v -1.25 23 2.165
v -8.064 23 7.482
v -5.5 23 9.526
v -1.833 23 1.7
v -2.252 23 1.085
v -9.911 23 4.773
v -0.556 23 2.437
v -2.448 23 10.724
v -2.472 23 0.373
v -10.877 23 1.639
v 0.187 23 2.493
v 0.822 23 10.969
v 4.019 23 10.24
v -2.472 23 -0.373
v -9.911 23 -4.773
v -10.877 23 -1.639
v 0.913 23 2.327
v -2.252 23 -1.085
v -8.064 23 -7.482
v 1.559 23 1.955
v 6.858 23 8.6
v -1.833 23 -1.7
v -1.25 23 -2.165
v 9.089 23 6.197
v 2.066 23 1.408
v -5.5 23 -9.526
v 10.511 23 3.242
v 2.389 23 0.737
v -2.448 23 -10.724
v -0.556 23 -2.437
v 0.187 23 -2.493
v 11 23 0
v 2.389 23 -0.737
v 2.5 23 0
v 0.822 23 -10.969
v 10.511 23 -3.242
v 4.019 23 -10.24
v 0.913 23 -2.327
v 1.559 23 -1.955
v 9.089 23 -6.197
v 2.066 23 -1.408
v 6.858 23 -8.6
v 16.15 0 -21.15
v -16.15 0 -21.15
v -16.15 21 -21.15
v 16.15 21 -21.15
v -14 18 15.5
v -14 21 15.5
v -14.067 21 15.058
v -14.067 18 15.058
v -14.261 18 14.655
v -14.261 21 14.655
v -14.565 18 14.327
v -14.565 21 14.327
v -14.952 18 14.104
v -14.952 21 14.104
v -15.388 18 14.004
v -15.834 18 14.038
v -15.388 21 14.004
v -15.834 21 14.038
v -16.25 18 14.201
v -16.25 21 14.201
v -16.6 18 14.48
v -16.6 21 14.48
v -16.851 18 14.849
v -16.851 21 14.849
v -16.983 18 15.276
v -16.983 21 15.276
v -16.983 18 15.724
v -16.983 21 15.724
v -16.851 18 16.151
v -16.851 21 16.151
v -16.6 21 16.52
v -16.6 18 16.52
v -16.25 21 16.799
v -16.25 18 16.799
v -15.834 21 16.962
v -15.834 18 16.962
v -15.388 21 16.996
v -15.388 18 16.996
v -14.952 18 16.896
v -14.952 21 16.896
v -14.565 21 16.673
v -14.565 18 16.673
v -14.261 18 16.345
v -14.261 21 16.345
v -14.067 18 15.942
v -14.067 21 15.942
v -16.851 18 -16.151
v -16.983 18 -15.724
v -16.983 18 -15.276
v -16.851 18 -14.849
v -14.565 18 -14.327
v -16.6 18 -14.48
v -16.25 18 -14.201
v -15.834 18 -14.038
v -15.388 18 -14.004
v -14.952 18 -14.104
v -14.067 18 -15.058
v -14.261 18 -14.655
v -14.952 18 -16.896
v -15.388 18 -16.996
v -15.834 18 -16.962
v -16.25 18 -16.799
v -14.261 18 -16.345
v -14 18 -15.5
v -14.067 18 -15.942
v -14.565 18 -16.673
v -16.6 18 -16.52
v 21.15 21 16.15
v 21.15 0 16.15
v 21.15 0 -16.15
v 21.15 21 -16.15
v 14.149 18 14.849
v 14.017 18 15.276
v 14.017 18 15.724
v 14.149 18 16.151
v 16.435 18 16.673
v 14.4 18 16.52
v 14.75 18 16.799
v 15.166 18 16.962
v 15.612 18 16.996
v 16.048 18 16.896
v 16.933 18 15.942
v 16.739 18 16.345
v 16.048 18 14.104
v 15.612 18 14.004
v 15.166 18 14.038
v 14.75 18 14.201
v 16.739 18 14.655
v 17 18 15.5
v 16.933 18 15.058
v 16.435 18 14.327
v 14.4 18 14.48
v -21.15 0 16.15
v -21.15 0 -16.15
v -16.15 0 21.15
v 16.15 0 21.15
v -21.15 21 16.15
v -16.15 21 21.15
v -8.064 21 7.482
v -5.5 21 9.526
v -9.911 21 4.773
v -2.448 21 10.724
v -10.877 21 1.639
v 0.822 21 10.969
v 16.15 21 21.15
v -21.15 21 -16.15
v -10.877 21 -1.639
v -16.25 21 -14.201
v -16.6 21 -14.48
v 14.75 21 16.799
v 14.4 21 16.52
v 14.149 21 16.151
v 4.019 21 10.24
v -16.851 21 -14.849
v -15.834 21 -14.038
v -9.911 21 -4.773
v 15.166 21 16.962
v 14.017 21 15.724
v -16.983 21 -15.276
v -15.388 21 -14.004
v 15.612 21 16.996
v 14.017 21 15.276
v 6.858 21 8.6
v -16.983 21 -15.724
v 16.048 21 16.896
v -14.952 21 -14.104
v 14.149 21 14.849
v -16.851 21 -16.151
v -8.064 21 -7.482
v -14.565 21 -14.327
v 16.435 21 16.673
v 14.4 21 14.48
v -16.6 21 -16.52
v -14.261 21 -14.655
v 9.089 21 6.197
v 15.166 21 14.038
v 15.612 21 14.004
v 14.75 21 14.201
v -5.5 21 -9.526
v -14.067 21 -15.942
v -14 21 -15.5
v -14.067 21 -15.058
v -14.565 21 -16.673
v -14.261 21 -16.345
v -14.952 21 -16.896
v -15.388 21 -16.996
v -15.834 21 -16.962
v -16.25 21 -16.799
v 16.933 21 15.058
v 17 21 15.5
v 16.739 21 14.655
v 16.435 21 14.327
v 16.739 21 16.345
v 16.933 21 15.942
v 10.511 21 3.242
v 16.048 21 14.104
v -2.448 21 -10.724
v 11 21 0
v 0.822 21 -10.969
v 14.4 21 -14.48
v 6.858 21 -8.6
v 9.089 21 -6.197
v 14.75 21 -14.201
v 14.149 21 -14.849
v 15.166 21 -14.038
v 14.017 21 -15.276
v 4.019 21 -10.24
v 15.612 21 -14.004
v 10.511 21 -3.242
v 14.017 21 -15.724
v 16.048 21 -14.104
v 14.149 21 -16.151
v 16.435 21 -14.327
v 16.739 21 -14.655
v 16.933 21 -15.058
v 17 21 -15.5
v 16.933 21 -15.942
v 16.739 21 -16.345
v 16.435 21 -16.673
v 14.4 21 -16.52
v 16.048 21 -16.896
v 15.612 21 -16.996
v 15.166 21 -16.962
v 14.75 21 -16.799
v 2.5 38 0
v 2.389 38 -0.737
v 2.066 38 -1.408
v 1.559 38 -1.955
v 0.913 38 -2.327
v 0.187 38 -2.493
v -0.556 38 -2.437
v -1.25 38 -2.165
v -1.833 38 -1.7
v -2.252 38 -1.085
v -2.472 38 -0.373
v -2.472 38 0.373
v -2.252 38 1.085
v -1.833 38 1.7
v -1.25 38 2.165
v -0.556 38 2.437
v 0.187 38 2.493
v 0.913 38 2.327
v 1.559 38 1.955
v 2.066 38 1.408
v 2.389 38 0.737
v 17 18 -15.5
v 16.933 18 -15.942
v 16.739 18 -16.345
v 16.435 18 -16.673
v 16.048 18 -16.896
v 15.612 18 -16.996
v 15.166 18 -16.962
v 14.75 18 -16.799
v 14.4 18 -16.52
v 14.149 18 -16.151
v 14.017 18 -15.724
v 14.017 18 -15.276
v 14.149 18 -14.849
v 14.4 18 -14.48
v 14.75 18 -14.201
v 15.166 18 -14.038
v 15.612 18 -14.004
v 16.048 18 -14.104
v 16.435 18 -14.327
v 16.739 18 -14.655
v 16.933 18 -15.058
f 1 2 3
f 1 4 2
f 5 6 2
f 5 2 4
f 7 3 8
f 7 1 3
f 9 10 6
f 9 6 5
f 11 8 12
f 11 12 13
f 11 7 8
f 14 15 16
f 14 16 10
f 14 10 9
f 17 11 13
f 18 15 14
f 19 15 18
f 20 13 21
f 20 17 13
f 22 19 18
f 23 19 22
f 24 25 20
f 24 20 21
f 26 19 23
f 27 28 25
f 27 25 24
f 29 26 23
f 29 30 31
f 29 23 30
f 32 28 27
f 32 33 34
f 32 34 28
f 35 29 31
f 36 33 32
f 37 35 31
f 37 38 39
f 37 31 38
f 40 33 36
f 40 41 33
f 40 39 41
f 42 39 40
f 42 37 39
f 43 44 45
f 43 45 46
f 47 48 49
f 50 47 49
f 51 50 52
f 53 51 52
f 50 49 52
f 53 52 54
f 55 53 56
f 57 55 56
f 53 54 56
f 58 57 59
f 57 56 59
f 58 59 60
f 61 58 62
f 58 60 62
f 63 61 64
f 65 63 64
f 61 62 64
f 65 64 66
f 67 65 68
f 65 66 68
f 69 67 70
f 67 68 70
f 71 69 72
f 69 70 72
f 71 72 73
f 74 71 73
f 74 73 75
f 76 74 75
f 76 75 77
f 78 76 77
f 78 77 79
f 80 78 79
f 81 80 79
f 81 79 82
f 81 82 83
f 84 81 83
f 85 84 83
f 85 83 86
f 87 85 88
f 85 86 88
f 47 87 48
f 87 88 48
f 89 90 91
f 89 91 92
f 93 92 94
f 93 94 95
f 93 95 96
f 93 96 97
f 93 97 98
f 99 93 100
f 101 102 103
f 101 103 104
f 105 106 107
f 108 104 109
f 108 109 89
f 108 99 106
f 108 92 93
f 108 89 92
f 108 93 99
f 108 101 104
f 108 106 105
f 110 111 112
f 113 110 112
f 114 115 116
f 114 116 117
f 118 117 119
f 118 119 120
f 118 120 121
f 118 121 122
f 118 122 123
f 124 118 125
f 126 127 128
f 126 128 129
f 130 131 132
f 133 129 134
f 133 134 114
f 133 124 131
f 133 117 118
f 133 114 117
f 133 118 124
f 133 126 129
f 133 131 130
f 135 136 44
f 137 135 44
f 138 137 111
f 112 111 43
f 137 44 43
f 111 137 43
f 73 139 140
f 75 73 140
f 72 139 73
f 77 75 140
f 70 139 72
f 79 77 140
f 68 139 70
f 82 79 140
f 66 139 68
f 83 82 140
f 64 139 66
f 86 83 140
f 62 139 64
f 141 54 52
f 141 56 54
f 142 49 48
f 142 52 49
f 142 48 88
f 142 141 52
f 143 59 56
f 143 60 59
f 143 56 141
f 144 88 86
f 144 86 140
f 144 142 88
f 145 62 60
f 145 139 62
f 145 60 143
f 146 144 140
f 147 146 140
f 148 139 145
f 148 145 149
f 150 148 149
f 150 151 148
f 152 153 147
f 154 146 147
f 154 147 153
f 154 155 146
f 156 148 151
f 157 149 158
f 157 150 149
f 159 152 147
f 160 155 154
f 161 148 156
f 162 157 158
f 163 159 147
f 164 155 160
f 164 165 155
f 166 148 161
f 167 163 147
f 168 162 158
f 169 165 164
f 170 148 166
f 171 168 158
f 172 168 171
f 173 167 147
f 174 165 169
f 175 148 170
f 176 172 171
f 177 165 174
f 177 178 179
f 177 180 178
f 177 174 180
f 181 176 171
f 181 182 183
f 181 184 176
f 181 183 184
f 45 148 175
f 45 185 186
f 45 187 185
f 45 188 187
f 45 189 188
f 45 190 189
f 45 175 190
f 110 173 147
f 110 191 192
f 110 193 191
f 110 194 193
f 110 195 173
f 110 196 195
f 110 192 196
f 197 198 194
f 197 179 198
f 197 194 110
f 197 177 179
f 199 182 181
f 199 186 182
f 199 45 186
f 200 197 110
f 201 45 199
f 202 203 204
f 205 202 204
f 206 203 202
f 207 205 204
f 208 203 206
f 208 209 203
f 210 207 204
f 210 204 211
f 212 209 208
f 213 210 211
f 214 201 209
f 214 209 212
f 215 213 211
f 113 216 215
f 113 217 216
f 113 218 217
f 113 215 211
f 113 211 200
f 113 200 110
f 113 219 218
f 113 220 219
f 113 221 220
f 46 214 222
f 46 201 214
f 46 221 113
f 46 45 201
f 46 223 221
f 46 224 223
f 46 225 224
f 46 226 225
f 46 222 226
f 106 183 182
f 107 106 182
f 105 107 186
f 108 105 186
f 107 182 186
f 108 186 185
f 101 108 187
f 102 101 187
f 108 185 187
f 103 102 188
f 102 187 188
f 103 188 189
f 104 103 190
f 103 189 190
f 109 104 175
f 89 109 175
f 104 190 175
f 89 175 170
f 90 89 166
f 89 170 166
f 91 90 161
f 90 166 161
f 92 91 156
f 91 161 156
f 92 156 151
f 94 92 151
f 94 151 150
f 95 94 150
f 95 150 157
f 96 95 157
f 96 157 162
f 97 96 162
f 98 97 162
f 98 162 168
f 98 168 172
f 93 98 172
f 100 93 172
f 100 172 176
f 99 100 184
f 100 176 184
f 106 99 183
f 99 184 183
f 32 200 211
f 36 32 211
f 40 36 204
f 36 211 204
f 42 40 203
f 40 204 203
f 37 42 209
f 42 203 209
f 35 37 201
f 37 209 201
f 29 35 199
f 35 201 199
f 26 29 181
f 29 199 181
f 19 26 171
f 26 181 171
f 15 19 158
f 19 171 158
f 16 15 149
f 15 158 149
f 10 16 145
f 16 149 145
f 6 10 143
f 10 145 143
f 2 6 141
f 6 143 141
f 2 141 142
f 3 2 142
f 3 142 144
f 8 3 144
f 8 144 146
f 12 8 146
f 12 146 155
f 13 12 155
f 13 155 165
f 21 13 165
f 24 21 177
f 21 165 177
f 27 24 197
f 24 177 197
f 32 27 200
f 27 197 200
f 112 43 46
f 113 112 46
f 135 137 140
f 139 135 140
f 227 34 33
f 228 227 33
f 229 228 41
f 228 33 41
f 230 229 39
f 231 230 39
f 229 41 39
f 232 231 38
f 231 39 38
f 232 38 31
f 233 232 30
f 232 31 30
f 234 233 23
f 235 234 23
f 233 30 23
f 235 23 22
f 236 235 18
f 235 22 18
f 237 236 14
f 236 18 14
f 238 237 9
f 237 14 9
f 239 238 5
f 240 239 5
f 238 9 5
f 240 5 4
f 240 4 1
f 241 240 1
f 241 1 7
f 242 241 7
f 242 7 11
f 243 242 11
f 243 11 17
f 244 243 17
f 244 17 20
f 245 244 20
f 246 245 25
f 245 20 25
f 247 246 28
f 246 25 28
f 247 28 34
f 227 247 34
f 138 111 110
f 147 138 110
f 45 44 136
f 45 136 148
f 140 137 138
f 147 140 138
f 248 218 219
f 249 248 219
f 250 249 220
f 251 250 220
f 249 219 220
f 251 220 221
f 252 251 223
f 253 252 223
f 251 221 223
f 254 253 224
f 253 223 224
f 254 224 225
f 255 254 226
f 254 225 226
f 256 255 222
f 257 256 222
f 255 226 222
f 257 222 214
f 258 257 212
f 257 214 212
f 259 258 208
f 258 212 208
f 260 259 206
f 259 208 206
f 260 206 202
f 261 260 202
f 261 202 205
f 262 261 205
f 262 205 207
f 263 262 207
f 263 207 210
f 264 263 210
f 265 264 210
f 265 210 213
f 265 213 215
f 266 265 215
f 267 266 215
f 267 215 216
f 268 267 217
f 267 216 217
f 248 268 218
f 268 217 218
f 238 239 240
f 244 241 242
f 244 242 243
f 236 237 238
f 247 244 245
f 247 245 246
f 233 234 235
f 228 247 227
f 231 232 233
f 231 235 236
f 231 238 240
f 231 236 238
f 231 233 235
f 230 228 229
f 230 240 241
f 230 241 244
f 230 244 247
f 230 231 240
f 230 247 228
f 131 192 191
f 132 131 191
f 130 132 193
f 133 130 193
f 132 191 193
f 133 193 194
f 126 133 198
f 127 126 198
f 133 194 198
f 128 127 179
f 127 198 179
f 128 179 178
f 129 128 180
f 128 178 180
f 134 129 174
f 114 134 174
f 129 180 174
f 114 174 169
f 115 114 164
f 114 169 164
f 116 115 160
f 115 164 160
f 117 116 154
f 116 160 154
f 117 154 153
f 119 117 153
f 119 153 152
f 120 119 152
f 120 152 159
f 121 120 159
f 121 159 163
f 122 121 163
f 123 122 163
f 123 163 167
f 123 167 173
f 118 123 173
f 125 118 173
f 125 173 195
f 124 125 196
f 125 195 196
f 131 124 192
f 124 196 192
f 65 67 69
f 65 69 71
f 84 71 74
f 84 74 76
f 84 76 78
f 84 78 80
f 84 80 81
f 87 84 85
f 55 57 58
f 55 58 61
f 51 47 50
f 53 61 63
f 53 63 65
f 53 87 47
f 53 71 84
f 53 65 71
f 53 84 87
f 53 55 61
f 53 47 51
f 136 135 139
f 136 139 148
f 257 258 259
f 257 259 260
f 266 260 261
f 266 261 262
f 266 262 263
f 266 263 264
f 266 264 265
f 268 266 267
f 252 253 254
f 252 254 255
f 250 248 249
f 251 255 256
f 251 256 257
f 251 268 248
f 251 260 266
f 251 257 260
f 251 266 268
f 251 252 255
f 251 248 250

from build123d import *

# Parameters (mm, degrees)
SKETCH1_W           = 42.3
SKETCH1_H           = 42.3
BOSS_EXTRUDE1_DEPTH = 21
CHAMFER1_SIZE       = 5
SKETCH2_R           = 1.5
CUT_EXTRUDE1_DEPTH  = 3
SKETCH3_R           = 11
BOSS_EXTRUDE2_DEPTH = 2
SKETCH4_R           = 2.5
BOSS_EXTRUDE3_DEPTH = 15


with BuildPart() as part:
    # Sketch1 → Boss-Extrude1 (new body)
    with BuildSketch(Plane(origin=(0, 0, 0), x_dir=(1, 0, 0), z_dir=(0, 1, 0))):
        Rectangle(SKETCH1_W, SKETCH1_H)
    extrude(amount=BOSS_EXTRUDE1_DEPTH)

    # Chamfer1
    chamfer1_edges = [part.edges().sort_by_distance(p)[0] for p in [
        (21.15, 10.5, 21.15),
        (-21.15, 10.5, 21.15),
        (-21.15, 10.5, -21.15),
        (21.15, 10.5, -21.15),
    ]]
    chamfer(chamfer1_edges, length=CHAMFER1_SIZE)

    # Sketch2 → Cut-Extrude1 (cut)
    with BuildSketch(Plane(origin=(0, 21, 0), x_dir=(1, 0, 0), z_dir=(0, 1, 0))):
        with Locations((15.5, -15.5)):
            Circle(SKETCH2_R)
        with Locations((15.5, 15.5)):
            Circle(SKETCH2_R)
        with Locations((-15.5, 15.5)):
            Circle(SKETCH2_R)
        with Locations((-15.5, -15.5)):
            Circle(SKETCH2_R)
    extrude(amount=-CUT_EXTRUDE1_DEPTH, mode=Mode.SUBTRACT)

    # Sketch3 → Boss-Extrude2 (add)
    with BuildSketch(Plane(origin=(0, 21, 0), x_dir=(1, 0, 0), z_dir=(0, 1, 0))):
        Circle(SKETCH3_R)
    extrude(amount=BOSS_EXTRUDE2_DEPTH)

    # Sketch4 → Boss-Extrude3 (add)
    with BuildSketch(Plane(origin=(0, 23, 0), x_dir=(1, 0, 0), z_dir=(0, 1, 0))):
        Circle(SKETCH4_R)
    extrude(amount=BOSS_EXTRUDE3_DEPTH)


solid = part.part
